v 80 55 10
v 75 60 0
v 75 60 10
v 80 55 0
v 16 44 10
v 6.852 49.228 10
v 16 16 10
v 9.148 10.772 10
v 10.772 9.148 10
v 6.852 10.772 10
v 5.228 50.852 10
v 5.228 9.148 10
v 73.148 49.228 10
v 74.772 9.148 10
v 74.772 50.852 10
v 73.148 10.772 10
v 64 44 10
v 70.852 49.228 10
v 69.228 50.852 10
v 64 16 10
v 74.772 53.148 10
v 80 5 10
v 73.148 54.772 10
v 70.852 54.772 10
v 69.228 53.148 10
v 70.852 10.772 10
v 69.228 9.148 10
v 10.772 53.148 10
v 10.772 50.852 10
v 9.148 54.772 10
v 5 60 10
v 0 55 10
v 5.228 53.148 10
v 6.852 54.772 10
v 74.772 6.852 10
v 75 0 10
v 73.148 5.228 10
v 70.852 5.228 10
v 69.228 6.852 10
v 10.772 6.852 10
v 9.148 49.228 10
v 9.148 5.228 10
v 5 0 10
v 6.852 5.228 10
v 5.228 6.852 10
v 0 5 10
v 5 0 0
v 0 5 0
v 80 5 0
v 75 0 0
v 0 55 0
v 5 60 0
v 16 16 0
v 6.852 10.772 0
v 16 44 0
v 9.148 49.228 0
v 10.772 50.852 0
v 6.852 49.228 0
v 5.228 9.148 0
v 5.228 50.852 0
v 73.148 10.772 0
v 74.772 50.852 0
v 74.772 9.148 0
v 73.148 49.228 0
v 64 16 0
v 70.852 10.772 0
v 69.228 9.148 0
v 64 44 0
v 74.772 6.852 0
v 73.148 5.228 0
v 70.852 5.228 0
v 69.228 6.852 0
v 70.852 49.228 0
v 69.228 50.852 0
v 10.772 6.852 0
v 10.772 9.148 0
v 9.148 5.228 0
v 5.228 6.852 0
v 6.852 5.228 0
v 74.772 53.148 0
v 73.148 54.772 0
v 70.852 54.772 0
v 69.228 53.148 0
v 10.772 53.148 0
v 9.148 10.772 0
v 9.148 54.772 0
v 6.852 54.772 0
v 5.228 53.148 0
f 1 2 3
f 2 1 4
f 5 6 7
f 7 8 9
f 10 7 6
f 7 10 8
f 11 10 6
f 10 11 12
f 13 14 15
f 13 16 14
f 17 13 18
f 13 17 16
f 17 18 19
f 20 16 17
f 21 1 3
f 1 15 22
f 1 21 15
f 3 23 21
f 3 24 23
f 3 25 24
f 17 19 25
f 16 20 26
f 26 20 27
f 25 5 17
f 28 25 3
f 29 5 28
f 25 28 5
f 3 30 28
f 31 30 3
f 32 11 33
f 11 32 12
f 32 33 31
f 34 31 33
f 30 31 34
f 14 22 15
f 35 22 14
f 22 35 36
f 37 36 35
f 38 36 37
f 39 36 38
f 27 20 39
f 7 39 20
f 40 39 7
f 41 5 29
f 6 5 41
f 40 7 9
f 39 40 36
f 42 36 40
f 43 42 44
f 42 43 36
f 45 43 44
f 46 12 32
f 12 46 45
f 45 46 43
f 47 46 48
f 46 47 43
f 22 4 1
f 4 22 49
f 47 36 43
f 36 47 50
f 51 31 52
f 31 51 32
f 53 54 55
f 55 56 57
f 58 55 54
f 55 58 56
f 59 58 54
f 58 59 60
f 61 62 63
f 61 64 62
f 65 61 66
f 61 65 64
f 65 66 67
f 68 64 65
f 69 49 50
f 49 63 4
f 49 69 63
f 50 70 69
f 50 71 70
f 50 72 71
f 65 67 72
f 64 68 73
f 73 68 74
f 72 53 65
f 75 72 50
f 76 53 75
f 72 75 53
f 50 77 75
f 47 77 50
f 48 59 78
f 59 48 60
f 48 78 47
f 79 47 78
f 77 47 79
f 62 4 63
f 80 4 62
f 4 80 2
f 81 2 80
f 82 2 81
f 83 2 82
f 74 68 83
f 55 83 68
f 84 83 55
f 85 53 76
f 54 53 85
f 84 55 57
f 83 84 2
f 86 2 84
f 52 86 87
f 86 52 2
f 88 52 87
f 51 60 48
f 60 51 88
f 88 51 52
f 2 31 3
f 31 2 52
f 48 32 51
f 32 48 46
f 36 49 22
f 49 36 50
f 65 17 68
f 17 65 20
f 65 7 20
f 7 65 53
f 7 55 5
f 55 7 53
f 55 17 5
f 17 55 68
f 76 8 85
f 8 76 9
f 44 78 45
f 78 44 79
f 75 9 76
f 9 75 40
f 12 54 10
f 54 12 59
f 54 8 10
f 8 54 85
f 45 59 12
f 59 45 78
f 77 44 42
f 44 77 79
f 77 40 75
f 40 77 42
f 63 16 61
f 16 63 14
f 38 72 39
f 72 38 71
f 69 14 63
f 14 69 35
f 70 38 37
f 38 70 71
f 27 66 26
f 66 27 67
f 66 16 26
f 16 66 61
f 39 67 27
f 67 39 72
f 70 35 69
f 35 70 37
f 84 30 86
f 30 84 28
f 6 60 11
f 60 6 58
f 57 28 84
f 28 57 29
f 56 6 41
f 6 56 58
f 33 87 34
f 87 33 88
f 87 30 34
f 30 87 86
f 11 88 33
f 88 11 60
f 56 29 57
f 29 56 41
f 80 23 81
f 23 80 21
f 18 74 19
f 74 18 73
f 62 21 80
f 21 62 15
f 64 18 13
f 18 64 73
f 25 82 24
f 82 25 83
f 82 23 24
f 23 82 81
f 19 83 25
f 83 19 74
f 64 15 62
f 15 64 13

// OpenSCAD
$fn = 32;

// ----------------------------------------------------------------------
// Frame plate: 80 x 60 frame, 16 mm rails
// ----------------------------------------------------------------------

// --- parameters (mm) ---
plate_l = 80;             // plate length, X
plate_w = 60;             // plate width, Y
plate_t = 10;             // plate thickness, Z (extrusion height)
corner_c = 5;             // corner chamfer
frame_bar = 16;           // frame rail width
bolt_r = 3;               // corner bolt window radius
bolt_inset = 8;           // bolt centre inset from the edges

win_l = plate_l - 2 * frame_bar;  // window length
win_w = plate_w - 2 * frame_bar;  // window width
bolt_d = 2 * bolt_r;  // corner hole diameter

profile = [[5, 0], [75, 0], [80, 5], [80, 55], [75, 60], [5, 60], [0, 55], [0, 5]];  // primary outline, 8 points, counter clockwise
void_1 = [[16, 16], [64, 16], [64, 44], [16, 44]];  // the window, 4 points
void_2 = [[10.772, 9.148], [9.148, 10.772], [6.852, 10.772], [5.228, 9.148], [5.228, 6.852], [6.852, 5.228], [9.148, 5.228], [10.772, 6.852]];  // corner bolt window, 8 points
void_3 = [[74.772, 9.148], [73.148, 10.772], [70.852, 10.772], [69.228, 9.148], [69.228, 6.852], [70.852, 5.228], [73.148, 5.228], [74.772, 6.852]];  // corner bolt window, 8 points
void_4 = [[10.772, 53.148], [9.148, 54.772], [6.852, 54.772], [5.228, 53.148], [5.228, 50.852], [6.852, 49.228], [9.148, 49.228], [10.772, 50.852]];  // corner bolt window, 8 points
void_5 = [[74.772, 53.148], [73.148, 54.772], [70.852, 54.772], [69.228, 53.148], [69.228, 50.852], [70.852, 49.228], [73.148, 49.228], [74.772, 50.852]];  // corner bolt window, 8 points

// --- the one profile operation ---
difference() {
  linear_extrude(height = plate_t) polygon(points = profile);
  translate([0, 0, -1])
    linear_extrude(height = plate_t + 2) polygon(points = void_1);
  translate([0, 0, -1])
    linear_extrude(height = plate_t + 2) polygon(points = void_2);
  translate([0, 0, -1])
    linear_extrude(height = plate_t + 2) polygon(points = void_3);
  translate([0, 0, -1])
    linear_extrude(height = plate_t + 2) polygon(points = void_4);
  translate([0, 0, -1])
    linear_extrude(height = plate_t + 2) polygon(points = void_5);
}
